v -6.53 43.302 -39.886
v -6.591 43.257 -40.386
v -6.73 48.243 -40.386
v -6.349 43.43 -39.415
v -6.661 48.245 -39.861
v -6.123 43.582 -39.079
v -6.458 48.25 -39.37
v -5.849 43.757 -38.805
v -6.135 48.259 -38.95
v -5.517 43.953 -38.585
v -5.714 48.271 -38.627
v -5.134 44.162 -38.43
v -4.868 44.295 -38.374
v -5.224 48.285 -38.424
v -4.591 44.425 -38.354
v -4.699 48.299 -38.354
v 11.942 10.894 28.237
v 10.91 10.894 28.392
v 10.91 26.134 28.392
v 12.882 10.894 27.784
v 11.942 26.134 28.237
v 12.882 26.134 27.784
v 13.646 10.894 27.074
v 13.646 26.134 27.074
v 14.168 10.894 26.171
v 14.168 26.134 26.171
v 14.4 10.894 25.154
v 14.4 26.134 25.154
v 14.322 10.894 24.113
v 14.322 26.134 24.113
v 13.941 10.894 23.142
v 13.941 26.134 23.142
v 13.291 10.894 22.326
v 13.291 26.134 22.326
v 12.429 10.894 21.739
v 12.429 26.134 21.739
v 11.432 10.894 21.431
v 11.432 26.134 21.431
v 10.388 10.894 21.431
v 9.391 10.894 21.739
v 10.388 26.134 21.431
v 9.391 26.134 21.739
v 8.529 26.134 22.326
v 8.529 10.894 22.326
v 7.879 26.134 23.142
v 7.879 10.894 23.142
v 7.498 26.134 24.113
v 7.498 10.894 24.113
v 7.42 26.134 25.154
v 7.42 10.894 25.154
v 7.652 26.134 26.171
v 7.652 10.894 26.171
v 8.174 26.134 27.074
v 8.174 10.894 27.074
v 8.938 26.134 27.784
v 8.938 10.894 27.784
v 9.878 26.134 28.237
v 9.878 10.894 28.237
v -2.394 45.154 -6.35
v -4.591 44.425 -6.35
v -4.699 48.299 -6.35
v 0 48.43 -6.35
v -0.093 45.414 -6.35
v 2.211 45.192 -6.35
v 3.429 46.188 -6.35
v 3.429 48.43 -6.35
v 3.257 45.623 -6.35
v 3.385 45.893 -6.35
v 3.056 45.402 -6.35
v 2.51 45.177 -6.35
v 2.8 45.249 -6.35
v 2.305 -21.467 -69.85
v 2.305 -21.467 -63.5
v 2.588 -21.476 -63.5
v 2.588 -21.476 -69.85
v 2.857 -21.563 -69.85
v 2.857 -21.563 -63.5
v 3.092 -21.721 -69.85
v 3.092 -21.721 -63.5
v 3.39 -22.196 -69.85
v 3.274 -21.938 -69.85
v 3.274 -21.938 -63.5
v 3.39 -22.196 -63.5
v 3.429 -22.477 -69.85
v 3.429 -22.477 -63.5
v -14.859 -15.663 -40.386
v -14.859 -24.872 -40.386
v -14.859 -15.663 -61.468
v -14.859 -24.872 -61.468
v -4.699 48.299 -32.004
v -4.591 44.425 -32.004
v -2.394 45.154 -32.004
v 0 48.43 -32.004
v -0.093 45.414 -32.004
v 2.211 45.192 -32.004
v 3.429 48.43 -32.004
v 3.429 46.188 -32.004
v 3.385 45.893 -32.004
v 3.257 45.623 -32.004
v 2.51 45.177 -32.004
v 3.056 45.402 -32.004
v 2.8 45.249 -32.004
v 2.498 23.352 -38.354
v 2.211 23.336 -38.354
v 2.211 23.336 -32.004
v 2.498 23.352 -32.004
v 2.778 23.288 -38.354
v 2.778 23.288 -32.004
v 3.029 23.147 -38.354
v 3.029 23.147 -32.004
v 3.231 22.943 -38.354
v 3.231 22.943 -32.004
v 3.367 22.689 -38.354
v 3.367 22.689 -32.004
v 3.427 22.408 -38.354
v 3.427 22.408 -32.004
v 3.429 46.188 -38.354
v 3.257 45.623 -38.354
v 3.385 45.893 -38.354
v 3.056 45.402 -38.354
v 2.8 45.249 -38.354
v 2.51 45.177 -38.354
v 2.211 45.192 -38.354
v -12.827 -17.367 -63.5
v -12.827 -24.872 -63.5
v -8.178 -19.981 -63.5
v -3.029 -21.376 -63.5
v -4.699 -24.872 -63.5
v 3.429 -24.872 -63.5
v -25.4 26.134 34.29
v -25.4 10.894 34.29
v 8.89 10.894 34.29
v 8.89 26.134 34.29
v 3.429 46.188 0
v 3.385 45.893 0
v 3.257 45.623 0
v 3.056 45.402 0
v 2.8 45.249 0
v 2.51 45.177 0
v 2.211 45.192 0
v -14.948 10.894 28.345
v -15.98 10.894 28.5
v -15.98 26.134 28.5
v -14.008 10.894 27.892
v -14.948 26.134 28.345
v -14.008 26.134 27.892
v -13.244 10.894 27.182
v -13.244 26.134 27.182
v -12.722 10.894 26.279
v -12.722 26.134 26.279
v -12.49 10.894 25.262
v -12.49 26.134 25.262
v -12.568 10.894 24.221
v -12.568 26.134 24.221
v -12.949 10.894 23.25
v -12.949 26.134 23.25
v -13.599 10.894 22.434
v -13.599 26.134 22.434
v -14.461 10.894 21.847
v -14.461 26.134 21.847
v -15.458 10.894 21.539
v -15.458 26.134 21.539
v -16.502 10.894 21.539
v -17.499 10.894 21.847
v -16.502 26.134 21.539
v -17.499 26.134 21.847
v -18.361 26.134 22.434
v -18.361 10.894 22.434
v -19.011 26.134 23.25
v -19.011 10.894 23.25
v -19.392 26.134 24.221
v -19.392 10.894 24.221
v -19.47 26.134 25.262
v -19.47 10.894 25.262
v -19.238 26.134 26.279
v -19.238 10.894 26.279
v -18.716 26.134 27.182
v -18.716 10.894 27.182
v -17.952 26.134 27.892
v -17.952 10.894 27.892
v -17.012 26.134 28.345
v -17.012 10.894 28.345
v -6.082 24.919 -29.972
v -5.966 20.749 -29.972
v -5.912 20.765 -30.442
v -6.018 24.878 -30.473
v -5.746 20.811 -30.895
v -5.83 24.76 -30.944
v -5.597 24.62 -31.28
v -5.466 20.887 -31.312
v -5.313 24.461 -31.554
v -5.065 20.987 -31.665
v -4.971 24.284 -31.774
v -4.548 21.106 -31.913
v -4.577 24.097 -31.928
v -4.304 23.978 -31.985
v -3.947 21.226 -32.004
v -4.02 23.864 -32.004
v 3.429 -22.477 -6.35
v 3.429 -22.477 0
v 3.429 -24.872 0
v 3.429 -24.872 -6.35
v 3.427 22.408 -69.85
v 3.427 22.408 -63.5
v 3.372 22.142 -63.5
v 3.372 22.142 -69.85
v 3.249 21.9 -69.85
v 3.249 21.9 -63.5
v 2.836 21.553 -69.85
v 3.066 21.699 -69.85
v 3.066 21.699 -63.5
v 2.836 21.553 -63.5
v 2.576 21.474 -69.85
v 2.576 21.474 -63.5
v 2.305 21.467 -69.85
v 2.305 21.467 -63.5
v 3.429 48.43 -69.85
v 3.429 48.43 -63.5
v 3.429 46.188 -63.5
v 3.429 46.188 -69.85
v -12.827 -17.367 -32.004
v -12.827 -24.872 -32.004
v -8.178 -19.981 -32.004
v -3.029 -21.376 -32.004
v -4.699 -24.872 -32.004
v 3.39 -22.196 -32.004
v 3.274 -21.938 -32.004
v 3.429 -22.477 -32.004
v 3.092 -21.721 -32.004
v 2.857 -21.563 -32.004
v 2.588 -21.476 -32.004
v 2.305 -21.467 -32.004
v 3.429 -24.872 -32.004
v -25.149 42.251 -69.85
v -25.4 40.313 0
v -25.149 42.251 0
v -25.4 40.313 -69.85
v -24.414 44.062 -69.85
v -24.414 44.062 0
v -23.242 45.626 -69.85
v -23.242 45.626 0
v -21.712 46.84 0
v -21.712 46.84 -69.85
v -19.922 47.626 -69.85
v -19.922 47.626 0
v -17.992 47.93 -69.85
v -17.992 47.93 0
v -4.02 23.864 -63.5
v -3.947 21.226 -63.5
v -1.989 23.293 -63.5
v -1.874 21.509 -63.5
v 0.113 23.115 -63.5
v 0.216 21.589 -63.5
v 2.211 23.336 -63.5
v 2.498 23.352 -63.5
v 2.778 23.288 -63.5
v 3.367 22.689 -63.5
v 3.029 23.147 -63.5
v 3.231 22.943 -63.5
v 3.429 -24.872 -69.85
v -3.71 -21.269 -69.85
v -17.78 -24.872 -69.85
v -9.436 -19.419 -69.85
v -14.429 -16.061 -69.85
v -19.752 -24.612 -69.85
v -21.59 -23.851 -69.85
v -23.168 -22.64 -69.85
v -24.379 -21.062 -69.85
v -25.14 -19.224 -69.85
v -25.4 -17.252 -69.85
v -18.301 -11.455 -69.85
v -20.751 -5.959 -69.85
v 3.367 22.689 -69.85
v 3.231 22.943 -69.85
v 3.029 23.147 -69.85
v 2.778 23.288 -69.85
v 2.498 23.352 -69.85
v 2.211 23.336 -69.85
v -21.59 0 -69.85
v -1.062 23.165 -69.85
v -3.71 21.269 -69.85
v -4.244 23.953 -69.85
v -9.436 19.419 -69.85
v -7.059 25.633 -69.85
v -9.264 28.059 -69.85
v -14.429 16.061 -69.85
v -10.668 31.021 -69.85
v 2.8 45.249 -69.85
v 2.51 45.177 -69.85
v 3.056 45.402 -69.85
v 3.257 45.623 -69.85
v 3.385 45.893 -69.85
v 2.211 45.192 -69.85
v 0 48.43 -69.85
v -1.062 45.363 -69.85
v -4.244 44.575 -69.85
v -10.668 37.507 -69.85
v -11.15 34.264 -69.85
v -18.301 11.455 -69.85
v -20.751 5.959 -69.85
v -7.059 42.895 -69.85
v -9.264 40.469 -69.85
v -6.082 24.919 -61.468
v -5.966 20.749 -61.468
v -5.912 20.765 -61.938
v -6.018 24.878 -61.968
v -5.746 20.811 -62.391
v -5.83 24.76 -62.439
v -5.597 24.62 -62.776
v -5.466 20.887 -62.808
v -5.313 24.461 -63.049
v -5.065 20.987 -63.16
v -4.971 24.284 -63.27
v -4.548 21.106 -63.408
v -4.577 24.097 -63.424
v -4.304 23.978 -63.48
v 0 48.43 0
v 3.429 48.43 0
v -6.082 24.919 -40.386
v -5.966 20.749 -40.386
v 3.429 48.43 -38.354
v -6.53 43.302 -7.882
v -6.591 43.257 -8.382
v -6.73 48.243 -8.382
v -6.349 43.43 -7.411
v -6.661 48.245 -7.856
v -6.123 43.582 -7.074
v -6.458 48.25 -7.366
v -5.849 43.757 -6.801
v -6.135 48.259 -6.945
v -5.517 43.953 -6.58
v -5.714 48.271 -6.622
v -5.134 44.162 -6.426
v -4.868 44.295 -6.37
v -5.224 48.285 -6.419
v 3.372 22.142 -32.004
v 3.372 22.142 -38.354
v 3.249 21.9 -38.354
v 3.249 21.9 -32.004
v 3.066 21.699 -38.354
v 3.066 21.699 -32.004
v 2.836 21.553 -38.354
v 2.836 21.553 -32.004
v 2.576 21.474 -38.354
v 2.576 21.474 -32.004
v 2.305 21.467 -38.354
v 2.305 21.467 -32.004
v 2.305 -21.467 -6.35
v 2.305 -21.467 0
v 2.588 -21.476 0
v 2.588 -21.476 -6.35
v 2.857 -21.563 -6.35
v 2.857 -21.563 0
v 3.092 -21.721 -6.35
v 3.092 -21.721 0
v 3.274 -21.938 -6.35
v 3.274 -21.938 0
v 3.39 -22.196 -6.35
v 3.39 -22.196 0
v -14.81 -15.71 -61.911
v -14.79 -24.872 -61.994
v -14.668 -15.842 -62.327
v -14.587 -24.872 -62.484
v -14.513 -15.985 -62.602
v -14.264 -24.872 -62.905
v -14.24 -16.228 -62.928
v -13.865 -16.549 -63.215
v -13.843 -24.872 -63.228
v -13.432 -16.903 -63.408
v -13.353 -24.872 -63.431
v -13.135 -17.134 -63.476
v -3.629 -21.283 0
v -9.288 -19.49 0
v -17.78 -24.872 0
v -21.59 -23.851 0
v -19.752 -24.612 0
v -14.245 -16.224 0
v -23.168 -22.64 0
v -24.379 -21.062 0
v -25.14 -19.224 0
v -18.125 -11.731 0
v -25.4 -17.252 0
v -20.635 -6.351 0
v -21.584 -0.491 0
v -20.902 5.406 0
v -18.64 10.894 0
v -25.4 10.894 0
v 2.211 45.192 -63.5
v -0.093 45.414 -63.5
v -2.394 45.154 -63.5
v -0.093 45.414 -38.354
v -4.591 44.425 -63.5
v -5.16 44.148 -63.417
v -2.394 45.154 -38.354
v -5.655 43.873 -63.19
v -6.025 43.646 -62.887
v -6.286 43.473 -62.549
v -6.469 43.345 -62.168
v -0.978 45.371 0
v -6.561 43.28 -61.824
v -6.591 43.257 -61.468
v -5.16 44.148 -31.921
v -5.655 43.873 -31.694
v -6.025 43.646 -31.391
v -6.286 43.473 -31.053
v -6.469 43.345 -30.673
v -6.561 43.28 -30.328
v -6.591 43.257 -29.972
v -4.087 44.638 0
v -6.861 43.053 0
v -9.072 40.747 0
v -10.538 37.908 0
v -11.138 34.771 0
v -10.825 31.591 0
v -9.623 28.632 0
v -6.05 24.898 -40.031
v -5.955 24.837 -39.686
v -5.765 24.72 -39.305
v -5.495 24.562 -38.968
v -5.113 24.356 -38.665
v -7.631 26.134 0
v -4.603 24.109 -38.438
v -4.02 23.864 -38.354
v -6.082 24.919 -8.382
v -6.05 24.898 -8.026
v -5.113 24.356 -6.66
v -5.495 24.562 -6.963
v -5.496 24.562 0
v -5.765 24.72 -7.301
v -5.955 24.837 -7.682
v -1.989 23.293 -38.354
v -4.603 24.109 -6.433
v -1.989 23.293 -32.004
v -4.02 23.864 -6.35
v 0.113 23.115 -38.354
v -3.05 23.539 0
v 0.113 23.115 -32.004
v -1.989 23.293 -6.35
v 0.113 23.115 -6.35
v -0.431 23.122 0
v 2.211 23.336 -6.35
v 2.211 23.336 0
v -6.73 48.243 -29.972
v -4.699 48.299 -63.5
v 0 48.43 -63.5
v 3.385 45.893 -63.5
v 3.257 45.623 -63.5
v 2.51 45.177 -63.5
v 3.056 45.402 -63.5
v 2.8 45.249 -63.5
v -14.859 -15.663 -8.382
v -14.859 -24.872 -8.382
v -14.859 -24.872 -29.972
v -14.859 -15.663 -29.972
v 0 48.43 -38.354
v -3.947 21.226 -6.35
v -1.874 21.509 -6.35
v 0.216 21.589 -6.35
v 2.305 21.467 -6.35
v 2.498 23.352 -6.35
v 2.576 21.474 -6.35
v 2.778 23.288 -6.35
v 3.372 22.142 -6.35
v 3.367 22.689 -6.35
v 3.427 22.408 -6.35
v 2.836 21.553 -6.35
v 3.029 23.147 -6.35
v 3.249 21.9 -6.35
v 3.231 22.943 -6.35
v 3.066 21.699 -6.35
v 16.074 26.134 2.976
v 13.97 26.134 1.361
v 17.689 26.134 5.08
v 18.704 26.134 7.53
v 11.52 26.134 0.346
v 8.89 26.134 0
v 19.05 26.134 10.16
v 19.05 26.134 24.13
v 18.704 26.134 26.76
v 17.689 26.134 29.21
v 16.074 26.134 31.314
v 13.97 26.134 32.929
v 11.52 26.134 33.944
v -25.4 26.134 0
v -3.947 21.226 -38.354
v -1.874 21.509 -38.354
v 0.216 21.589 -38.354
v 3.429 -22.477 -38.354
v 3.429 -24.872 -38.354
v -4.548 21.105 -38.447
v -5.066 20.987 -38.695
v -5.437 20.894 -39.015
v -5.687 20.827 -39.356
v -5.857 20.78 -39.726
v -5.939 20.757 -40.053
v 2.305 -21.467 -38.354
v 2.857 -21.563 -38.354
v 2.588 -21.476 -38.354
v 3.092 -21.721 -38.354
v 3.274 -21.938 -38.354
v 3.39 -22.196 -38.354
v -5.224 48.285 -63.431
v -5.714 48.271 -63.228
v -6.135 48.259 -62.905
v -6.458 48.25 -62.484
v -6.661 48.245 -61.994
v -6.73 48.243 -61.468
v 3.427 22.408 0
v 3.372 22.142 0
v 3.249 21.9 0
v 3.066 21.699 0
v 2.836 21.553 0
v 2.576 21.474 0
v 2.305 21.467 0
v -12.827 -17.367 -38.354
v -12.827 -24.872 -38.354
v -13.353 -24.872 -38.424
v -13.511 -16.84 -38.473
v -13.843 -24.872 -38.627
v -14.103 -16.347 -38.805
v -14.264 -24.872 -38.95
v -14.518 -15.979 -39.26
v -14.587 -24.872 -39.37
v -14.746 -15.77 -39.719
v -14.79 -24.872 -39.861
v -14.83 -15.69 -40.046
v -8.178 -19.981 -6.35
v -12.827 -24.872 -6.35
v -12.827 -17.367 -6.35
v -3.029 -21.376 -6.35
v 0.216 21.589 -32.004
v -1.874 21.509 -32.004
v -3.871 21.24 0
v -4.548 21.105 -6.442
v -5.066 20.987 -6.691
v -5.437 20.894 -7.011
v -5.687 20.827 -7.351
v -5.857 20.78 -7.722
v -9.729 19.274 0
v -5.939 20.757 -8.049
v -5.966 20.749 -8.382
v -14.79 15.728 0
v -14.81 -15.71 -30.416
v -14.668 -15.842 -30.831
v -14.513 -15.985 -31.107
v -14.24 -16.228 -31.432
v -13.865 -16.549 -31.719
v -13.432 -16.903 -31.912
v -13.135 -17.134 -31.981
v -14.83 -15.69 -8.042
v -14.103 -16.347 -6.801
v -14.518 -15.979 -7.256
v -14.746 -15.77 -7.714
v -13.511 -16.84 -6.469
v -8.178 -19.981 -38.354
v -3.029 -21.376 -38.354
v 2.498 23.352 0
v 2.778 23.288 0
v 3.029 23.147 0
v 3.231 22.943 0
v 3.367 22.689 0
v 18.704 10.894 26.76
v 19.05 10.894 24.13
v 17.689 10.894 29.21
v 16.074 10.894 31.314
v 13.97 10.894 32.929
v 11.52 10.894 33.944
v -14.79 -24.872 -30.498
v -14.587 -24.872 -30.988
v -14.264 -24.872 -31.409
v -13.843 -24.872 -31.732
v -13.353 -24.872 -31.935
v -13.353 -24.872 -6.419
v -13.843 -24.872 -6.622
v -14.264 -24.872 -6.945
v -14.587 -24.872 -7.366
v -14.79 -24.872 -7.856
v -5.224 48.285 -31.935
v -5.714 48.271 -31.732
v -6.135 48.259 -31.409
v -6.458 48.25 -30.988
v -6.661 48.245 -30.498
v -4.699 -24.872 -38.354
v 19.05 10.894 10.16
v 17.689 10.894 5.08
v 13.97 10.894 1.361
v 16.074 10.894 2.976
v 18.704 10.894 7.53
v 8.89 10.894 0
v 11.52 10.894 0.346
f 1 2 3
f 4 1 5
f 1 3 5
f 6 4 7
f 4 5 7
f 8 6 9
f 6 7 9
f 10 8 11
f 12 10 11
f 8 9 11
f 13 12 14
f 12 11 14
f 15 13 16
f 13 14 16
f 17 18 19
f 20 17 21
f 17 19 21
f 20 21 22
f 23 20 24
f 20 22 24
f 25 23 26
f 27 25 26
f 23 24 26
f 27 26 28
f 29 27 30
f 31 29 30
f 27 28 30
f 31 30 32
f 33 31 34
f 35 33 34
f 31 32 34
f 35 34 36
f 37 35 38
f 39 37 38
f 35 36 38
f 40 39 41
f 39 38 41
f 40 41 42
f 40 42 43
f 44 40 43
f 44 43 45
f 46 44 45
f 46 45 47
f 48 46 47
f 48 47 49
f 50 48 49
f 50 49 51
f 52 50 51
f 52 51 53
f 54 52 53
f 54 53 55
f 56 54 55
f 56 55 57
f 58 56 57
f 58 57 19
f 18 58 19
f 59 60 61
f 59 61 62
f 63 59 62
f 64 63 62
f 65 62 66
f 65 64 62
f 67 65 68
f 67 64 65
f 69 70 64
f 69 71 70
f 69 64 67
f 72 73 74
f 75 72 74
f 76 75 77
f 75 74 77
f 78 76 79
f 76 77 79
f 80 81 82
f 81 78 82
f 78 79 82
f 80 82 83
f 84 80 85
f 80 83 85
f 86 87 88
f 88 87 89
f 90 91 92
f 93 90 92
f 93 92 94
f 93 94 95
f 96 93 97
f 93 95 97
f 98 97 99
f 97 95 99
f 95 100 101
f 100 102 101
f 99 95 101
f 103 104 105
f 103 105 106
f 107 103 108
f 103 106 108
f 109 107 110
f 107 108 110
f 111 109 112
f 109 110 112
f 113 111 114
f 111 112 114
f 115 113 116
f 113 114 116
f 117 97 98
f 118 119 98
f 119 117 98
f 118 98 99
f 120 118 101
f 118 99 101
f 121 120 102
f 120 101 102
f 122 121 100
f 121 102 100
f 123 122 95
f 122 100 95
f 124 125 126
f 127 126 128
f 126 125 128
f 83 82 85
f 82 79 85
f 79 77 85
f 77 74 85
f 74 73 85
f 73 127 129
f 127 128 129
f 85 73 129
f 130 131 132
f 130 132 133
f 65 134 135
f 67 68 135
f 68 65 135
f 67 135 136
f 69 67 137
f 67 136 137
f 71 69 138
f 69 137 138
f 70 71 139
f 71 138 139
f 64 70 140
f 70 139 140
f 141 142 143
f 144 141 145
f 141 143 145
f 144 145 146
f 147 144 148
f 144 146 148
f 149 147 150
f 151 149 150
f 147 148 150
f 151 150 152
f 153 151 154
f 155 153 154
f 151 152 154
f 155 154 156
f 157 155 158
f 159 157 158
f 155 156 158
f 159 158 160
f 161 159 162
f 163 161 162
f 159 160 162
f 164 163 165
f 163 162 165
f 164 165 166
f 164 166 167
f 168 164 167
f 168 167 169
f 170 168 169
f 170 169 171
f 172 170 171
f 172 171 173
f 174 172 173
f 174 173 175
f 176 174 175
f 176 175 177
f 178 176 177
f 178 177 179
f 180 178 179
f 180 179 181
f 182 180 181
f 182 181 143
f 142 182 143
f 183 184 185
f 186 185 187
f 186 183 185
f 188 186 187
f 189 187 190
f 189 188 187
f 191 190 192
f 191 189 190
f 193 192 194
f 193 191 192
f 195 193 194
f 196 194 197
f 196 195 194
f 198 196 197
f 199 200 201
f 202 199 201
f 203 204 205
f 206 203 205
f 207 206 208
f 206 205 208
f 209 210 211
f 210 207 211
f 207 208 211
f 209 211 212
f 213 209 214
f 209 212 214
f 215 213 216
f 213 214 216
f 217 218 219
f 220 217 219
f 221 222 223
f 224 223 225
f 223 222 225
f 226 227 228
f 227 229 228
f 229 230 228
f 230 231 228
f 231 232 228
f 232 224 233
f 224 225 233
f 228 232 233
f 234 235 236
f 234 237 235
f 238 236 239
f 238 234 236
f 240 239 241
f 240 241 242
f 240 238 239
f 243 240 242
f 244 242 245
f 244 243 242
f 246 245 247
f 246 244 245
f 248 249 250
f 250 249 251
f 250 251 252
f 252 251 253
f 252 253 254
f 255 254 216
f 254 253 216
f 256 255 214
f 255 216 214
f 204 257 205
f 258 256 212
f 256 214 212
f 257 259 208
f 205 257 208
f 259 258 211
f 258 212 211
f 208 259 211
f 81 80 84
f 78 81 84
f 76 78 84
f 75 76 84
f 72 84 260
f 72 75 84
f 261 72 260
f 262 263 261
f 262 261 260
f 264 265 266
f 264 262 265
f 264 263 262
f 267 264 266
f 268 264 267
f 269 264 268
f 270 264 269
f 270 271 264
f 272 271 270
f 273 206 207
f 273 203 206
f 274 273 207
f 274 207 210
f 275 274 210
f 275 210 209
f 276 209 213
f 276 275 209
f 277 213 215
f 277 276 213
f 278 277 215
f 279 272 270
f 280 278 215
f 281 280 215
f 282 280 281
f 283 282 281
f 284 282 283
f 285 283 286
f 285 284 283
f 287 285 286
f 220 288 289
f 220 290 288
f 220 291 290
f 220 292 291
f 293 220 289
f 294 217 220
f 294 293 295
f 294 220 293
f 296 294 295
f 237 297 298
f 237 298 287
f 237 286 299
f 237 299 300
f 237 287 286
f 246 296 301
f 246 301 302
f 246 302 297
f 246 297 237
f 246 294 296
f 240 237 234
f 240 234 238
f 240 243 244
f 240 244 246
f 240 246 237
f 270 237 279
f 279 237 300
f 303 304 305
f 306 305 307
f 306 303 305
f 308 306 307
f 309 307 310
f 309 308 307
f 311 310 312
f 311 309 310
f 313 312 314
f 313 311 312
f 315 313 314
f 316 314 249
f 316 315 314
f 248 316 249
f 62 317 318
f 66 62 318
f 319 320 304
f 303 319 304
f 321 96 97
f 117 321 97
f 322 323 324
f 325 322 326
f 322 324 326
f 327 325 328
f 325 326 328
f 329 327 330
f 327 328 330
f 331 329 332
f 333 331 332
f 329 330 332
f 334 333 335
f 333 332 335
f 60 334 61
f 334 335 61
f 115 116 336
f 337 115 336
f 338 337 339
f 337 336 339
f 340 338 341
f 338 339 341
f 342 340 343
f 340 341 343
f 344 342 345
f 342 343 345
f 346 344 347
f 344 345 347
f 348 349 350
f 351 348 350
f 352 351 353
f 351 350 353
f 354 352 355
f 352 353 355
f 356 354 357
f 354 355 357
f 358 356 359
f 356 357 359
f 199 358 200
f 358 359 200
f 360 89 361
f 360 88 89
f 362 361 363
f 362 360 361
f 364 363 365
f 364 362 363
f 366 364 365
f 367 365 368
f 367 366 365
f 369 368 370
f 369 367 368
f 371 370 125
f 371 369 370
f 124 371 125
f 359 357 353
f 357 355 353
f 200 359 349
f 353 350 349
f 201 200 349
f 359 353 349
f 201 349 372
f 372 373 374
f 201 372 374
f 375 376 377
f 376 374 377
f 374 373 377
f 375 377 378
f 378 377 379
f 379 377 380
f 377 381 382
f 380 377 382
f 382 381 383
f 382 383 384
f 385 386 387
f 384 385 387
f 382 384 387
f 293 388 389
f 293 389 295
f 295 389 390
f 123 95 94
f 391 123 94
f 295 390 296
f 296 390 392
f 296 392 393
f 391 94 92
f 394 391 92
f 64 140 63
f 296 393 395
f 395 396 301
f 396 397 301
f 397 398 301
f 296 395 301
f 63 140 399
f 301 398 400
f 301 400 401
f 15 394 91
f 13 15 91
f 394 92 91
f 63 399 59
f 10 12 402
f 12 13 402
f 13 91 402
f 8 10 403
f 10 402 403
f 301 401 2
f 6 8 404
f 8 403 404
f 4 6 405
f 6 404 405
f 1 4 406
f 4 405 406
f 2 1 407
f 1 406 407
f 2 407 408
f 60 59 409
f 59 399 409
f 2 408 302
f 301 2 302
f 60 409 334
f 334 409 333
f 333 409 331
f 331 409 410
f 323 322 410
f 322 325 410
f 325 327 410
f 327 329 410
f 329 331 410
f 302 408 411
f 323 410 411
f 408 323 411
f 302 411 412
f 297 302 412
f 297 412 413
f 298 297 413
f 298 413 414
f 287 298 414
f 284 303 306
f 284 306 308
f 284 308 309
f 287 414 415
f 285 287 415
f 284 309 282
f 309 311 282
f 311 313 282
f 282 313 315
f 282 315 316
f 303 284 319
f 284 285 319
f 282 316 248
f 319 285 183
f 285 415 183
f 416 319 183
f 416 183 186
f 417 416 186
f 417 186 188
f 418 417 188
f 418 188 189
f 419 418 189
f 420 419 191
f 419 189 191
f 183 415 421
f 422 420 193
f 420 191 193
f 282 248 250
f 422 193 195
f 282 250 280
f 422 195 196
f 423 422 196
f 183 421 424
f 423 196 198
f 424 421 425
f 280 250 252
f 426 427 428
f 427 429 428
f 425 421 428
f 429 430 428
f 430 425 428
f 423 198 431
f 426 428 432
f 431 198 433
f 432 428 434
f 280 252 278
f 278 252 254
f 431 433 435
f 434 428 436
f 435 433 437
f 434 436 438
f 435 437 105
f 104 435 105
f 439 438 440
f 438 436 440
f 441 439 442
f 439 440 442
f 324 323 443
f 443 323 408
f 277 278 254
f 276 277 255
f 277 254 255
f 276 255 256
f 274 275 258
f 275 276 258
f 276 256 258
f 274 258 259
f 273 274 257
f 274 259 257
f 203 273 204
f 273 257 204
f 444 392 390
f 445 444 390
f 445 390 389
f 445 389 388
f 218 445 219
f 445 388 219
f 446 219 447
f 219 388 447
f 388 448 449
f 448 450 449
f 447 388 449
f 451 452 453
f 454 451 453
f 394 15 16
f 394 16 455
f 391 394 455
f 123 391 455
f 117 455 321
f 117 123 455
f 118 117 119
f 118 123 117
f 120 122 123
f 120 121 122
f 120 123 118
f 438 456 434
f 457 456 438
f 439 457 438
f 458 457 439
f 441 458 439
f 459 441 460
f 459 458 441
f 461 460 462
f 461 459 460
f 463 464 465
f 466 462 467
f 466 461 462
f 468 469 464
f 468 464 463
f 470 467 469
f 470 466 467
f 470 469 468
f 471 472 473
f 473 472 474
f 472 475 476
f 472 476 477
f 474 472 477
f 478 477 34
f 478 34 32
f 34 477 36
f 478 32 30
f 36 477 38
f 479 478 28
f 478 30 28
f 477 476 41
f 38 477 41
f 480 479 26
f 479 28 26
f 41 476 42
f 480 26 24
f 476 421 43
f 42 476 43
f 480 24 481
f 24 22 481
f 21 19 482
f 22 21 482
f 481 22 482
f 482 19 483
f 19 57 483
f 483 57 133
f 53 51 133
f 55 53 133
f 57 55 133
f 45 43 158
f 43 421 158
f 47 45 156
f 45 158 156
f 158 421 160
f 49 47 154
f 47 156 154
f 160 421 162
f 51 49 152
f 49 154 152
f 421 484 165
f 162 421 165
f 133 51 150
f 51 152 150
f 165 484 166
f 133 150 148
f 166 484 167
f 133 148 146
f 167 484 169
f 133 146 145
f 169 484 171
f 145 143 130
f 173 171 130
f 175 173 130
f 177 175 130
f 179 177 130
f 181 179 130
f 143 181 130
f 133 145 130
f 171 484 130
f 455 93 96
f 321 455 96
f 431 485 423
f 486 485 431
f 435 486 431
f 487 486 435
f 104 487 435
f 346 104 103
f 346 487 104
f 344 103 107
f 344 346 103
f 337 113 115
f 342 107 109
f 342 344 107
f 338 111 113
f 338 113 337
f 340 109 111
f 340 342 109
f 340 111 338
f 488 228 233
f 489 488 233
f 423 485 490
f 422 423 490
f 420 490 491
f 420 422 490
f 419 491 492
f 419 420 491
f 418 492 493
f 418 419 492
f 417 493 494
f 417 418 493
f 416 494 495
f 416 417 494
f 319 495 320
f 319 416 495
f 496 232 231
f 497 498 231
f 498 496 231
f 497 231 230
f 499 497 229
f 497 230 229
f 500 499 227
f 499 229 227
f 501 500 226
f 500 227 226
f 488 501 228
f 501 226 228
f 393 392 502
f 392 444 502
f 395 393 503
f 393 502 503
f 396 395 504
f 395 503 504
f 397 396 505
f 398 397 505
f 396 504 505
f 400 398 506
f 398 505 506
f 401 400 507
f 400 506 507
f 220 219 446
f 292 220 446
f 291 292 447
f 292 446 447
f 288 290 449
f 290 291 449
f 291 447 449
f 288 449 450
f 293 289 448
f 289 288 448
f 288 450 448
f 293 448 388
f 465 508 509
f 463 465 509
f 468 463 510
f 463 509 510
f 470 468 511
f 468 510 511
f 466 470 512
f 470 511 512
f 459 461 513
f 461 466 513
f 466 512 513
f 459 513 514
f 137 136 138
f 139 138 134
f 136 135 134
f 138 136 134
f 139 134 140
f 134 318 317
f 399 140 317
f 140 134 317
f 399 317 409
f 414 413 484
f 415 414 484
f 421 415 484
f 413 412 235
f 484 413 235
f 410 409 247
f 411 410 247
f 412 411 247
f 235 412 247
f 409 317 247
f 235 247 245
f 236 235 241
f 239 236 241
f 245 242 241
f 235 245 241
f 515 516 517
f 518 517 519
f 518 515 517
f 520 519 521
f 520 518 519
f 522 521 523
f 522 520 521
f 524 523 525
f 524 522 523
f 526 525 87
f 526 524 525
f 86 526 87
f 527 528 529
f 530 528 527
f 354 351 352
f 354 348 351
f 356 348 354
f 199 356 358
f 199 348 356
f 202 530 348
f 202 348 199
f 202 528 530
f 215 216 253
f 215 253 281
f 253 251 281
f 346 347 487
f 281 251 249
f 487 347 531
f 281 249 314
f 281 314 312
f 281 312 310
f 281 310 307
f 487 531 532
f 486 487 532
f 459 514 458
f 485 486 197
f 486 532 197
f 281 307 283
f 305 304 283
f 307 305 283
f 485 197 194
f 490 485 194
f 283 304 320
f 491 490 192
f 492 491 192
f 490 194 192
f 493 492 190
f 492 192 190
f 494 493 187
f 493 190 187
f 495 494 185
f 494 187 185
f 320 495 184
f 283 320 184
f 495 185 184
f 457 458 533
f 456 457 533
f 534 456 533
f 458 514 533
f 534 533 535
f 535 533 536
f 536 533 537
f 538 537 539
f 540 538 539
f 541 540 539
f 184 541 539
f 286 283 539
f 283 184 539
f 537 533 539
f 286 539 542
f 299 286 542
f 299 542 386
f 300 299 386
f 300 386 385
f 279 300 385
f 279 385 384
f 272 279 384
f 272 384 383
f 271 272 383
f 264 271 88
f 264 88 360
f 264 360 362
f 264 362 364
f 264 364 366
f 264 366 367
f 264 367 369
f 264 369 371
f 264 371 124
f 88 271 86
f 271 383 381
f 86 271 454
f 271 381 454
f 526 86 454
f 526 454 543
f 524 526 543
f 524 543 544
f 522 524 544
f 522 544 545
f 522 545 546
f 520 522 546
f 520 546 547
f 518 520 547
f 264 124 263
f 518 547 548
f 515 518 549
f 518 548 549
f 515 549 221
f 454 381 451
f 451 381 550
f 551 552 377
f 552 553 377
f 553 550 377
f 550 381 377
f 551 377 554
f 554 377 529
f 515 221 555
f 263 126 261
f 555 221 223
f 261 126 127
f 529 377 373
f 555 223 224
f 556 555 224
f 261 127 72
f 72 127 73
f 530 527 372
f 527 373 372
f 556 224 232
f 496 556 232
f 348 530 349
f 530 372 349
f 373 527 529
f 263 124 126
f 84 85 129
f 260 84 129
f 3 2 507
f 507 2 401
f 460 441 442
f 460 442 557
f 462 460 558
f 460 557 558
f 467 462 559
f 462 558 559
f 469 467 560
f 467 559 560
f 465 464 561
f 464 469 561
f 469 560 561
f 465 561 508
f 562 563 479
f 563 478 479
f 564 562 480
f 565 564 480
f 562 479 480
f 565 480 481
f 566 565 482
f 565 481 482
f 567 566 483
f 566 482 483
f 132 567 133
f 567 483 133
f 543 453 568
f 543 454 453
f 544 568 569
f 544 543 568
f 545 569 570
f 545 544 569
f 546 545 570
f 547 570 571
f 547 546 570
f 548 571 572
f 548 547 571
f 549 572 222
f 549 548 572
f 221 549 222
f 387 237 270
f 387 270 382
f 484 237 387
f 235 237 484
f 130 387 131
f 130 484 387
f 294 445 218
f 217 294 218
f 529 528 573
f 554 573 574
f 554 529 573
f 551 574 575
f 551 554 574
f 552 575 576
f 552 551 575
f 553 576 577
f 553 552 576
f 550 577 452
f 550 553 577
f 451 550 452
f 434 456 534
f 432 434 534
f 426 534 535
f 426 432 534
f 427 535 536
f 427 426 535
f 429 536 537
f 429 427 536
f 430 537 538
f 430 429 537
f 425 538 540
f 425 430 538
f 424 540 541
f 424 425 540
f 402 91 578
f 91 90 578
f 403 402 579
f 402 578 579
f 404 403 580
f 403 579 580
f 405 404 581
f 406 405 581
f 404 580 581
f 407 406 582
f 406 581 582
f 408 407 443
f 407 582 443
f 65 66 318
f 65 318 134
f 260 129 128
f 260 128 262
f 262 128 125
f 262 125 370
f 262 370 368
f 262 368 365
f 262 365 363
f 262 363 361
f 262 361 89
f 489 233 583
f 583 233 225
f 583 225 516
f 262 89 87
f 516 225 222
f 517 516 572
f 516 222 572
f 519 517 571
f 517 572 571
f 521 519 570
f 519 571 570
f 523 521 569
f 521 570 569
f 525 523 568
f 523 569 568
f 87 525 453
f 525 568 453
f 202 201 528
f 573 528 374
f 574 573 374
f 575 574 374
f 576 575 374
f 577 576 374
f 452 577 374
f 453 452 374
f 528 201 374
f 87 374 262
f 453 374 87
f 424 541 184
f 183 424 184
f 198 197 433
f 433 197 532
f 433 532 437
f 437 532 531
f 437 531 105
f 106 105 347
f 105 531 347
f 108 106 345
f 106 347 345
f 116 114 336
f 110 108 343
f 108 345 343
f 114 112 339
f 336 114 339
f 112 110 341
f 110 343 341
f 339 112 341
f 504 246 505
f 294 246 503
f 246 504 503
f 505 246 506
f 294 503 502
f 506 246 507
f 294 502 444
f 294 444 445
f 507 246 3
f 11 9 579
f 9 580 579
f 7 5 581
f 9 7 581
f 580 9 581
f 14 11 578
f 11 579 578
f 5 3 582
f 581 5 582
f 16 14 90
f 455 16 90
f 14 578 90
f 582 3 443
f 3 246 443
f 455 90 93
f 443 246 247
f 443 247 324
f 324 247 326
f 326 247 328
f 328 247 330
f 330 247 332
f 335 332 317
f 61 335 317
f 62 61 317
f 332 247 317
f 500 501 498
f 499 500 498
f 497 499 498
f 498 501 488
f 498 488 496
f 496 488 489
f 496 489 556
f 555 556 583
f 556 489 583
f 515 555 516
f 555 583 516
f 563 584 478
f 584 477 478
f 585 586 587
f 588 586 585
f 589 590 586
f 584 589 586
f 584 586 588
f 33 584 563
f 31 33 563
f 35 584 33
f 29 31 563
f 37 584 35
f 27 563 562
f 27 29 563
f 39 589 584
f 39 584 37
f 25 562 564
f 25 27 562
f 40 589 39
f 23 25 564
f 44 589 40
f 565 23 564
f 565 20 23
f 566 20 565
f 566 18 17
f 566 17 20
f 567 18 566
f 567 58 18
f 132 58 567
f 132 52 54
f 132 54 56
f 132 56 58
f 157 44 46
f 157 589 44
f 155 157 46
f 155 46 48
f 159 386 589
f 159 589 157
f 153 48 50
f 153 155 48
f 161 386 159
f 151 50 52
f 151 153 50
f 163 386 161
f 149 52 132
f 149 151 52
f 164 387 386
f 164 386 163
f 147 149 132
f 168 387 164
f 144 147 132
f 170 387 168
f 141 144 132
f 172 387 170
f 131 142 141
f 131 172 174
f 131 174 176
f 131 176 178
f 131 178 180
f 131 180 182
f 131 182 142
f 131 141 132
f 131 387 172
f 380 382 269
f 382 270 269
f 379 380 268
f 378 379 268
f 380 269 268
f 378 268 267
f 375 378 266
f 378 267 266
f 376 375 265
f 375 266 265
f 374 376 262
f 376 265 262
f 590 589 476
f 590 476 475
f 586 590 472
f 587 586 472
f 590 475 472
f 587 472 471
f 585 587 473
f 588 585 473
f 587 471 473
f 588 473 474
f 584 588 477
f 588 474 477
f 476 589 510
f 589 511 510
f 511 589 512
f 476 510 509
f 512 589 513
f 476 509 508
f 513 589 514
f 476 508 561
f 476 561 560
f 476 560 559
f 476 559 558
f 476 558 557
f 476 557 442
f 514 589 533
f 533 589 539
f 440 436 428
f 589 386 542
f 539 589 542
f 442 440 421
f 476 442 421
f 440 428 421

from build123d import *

# Parameters (mm, degrees)
BOSS_EXTRUDE1_DEPTH     = 69.85
CUT_EXTRUDE1_DEPTH      = 2.54
CUT_EXTRUDE1_DEPTH_BACK = 105.044993435
SKETCH2_W               = 16.044844987
SKETCH2_H               = 25.145576203
SKETCH2_H_2             = 25.654423797
CUT_EXTRUDE2_DEPTH      = 13.97
FILLET1_R               = 1.016
FILLET2_R               = 2.032
SKETCH4_W               = 34.29
SKETCH4_H               = 15.24
BOSS_EXTRUDE2_DEPTH     = 44.45
FILLET3_R               = 10.16
SKETCH5_R               = 3.5
CUT_EXTRUDE3_DEPTH      = 91.143248047
FILLET4_R               = 7.62


with BuildPart() as part:
    # Sketch1 → Boss-Extrude1 (new body)
    with BuildSketch(Plane.XY):
        with BuildLine():
            Line((3.429, -21.315957849), (3.429, -24.871957849))
            Line((3.429, -24.871957849), (0, -24.871957849))
            Line((0, -24.871957849), (-25.4, -24.871957849))
            Line((-25.4, -24.871957849), (-25.4, 47.724146141))
            Line((-25.4, 47.724146141), (0, 48.429639909))
            Line((0, 48.429639909), (3.429, 48.429639909))
            Line((3.429, 48.429639909), (3.429, 44.873639909))
            ThreePointArc((3.429, 44.873639909), (-11.15, 34.264), (3.429, 23.654360091))
            Line((3.429, 23.654360091), (3.429, 21.315957849))
            ThreePointArc((3.429, 21.315957849), (-21.59, 0), (3.429, -21.315957849))
        make_face()
    extrude(amount=-BOSS_EXTRUDE1_DEPTH)

    # Sketch2 → Cut-Extrude1 (cut, two sides: drawn at the far end of the back side and taken through both)
    with BuildSketch(Plane(origin=(-1.344113023, 48.392306706, 0), x_dir=(0.9996144881434057, 0.027764637469221053, 0), z_dir=(-0.027764637469221053, 0.9996144881434057, 0)).offset(-CUT_EXTRUDE1_DEPTH_BACK)):
        with Locations((2.634731969, 50.927211899)):
            Rectangle(SKETCH2_W, SKETCH2_H)
        with Locations((2.634731969, 19.177211899)):
            Rectangle(SKETCH2_W, SKETCH2_H_2)
    extrude(amount=CUT_EXTRUDE1_DEPTH + CUT_EXTRUDE1_DEPTH_BACK, mode=Mode.SUBTRACT)

    # Sketch3 → Cut-Extrude2 (cut)
    with BuildSketch(Plane.XZ.offset(24.871957849)):
        Polygon((-4.69894113, -6.35), (-14.85894113, -6.35), (-14.85894113, -32.004423797), (-7.683449997, -32.004423797), (-4.37926474, -32.004423797), (-4.37926474, -6.35), align=None)
        Polygon((-4.69894113, -38.354423797), (-14.85894113, -38.354423797), (-14.85894113, -63.5), (-7.683449997, -63.5), (-2.422701427, -63.5), (-2.422701427, -38.354423797), align=None)
    extrude(amount=-CUT_EXTRUDE2_DEPTH, mode=Mode.SUBTRACT)

    # Fillet1
    # the kernel refuses this fillet: 1.016 mm, written as the material it takes off along each edge
    with BuildSketch(Plane(origin=(3.429, -21.315957849, -60.597776235), x_dir=(-0.9911390490997786, -0.13282840565777682, 0), z_dir=(0, 0, -1)), Plane(origin=(3.429, -21.315957849, -29.102200032), x_dir=(-0.9911390490997786, -0.13282840565777682, 0), z_dir=(0, 0, -1))) as fillet1_piece_1:
        with BuildLine():
            CenterArc((1.161196376, -1.015649261), FILLET1_R, 91.505550469, 96.127515329)
            Line((0.154199102, -1.150602921), (0, 0))
            ThreePointArc((0, 0), (0.567251103, -0.007453204), (1.134502207, 0))
        make_face()
    extrude(amount=12.15444753, mode=Mode.SUBTRACT)
    with BuildSketch(Plane(origin=(3.429, 44.873639909, -60.213343849), x_dir=(-0.967377188342964, 0.25334043394938266, 0), z_dir=(0, 0, -1)), Plane(origin=(3.429, 44.873639909, -28.717767646), x_dir=(-0.967377188342964, 0.25334043394938266, 0), z_dir=(0, 0, -1)), Plane(origin=(3.429, 44.873639909, 3.286656151), x_dir=(-0.967377188342964, 0.25334043394938266, 0), z_dir=(0, 0, -1))) as fillet1_piece_2:
        with BuildLine():
            CenterArc((1.315912382, 1.014380594), FILLET1_R, 165.324729703, 101.43988218)
            Line((0.333057158, 1.271774475), (0, 0))
            ThreePointArc((0, 0), (0.6292856, 0.017772027), (1.2585712, 0))
        make_face()
    extrude(amount=12.923312302, mode=Mode.SUBTRACT)
    with BuildSketch(Plane(origin=(3.429, 23.654360091, -60.213343849), x_dir=(-0.9673771883429638, -0.2533404339493828, 0), z_dir=(0, 0, -1)), Plane(origin=(3.429, 23.654360091, -28.717767646), x_dir=(-0.9673771883429638, -0.2533404339493828, 0), z_dir=(0, 0, -1)), Plane(origin=(3.429, 23.654360091, 3.286656151), x_dir=(-0.9673771883429638, -0.2533404339493828, 0), z_dir=(0, 0, -1))) as fillet1_piece_3:
        with BuildLine():
            CenterArc((1.315912382, -1.014380594), FILLET1_R, 93.235388117, 101.43988218)
            Line((0.333057158, -1.271774475), (0, 0))
            ThreePointArc((0, 0), (0.6292856, -0.017772027), (1.2585712, 0))
        make_face()
    extrude(amount=12.923312302, mode=Mode.SUBTRACT)
    with BuildSketch(Plane(origin=(3.429, 21.315957849, -60.597776235), x_dir=(-0.9911390490997777, 0.13282840565778328, 0), z_dir=(0, 0, -1)), Plane(origin=(3.429, 21.315957849, -29.102200032), x_dir=(-0.9911390490997777, 0.13282840565778328, 0), z_dir=(0, 0, -1)), Plane(origin=(3.429, 21.315957849, 2.902223765), x_dir=(-0.9911390490997777, 0.13282840565778328, 0), z_dir=(0, 0, -1))) as fillet1_piece_4:
        with BuildLine():
            CenterArc((1.161196376, 1.015649261), FILLET1_R, 172.366934203, 96.127515328)
            Line((0.154199102, 1.150602921), (0, 0))
            ThreePointArc((0, 0), (0.567251103, 0.007453204), (1.134502207, 0))
        make_face()
    extrude(amount=12.15444753, mode=Mode.SUBTRACT)
    with BuildSketch(Plane(origin=(3.429, -21.315957849, 2.902223765), x_dir=(0, -1, 0), z_dir=(0, 0, -1))) as fillet1_piece_5:
        with BuildLine():
            CenterArc((1.160889506, 1.016), FILLET1_R, 173.872484672, 96.127515328)
            ThreePointArc((0.150694119, 1.124449438), (0.082734222, 0.561234722), (0, 0))
            Line((0, 0), (1.160889506, 0))
        make_face()
    extrude(amount=12.15444753, mode=Mode.SUBTRACT)

    # Fillet2
    fillet2_edges = [part.edges().sort_by_distance(p)[0] for p in [
        (-14.85894113, -20.267644911, -6.35),
        (-14.85894113, -20.267644911, -32.004423797),
        (-14.85894113, -20.267644911, -38.354423797),
        (-14.85894113, -20.267644911, -63.5),
        (-6.023991911, 22.834048029, -63.5),
        (-6.660489458, 45.749966547, -63.5),
        (-6.660489458, 45.749966547, -38.354423797),
        (-6.023991911, 22.834048029, -38.354423797),
        (-6.023991911, 22.834048029, -32.004423797),
        (-6.660489458, 45.749966547, -32.004423797),
        (-6.660489458, 45.749966547, -6.35),
        (-6.023991911, 22.834048029, -6.35),
    ]]
    fillet(fillet2_edges, radius=FILLET2_R)

    # Sketch4 → Boss-Extrude2 (add)
    with BuildSketch(Plane.ZY.offset(25.4)):
        with Locations((17.145, 18.514146141)):
            Rectangle(SKETCH4_W, SKETCH4_H)
    extrude(amount=-BOSS_EXTRUDE2_DEPTH)

    # Fillet3
    fillet3_edges = [part.edges().sort_by_distance(p)[0] for p in [
        (19.05, 18.514146141, 0),
        (19.05, 18.514146141, 34.29),
    ]]
    fillet(fillet3_edges, radius=FILLET3_R)

    # Sketch5 → Cut-Extrude3 (cut, through all)
    with BuildSketch(Plane(origin=(0, 26.134146141, 0), x_dir=(1, 0, 0), z_dir=(0, 1, 0))):
        with Locations(Location((10.91, -24.892, 0), (0, 0, 270))):
            Circle(SKETCH5_R)
        with Locations(Location((-15.98, -25, 0), (0, 0, 270))):
            Circle(SKETCH5_R)
    extrude(amount=-CUT_EXTRUDE3_DEPTH, mode=Mode.SUBTRACT)

    # Fillet4
    fillet4_edges = [part.edges().sort_by_distance(p)[0] for p in [
        (-25.4, -24.871957849, -34.925),
        (-25.4, 47.724146141, -34.925),
    ]]
    fillet(fillet4_edges, radius=FILLET4_R)


solid = part.part
